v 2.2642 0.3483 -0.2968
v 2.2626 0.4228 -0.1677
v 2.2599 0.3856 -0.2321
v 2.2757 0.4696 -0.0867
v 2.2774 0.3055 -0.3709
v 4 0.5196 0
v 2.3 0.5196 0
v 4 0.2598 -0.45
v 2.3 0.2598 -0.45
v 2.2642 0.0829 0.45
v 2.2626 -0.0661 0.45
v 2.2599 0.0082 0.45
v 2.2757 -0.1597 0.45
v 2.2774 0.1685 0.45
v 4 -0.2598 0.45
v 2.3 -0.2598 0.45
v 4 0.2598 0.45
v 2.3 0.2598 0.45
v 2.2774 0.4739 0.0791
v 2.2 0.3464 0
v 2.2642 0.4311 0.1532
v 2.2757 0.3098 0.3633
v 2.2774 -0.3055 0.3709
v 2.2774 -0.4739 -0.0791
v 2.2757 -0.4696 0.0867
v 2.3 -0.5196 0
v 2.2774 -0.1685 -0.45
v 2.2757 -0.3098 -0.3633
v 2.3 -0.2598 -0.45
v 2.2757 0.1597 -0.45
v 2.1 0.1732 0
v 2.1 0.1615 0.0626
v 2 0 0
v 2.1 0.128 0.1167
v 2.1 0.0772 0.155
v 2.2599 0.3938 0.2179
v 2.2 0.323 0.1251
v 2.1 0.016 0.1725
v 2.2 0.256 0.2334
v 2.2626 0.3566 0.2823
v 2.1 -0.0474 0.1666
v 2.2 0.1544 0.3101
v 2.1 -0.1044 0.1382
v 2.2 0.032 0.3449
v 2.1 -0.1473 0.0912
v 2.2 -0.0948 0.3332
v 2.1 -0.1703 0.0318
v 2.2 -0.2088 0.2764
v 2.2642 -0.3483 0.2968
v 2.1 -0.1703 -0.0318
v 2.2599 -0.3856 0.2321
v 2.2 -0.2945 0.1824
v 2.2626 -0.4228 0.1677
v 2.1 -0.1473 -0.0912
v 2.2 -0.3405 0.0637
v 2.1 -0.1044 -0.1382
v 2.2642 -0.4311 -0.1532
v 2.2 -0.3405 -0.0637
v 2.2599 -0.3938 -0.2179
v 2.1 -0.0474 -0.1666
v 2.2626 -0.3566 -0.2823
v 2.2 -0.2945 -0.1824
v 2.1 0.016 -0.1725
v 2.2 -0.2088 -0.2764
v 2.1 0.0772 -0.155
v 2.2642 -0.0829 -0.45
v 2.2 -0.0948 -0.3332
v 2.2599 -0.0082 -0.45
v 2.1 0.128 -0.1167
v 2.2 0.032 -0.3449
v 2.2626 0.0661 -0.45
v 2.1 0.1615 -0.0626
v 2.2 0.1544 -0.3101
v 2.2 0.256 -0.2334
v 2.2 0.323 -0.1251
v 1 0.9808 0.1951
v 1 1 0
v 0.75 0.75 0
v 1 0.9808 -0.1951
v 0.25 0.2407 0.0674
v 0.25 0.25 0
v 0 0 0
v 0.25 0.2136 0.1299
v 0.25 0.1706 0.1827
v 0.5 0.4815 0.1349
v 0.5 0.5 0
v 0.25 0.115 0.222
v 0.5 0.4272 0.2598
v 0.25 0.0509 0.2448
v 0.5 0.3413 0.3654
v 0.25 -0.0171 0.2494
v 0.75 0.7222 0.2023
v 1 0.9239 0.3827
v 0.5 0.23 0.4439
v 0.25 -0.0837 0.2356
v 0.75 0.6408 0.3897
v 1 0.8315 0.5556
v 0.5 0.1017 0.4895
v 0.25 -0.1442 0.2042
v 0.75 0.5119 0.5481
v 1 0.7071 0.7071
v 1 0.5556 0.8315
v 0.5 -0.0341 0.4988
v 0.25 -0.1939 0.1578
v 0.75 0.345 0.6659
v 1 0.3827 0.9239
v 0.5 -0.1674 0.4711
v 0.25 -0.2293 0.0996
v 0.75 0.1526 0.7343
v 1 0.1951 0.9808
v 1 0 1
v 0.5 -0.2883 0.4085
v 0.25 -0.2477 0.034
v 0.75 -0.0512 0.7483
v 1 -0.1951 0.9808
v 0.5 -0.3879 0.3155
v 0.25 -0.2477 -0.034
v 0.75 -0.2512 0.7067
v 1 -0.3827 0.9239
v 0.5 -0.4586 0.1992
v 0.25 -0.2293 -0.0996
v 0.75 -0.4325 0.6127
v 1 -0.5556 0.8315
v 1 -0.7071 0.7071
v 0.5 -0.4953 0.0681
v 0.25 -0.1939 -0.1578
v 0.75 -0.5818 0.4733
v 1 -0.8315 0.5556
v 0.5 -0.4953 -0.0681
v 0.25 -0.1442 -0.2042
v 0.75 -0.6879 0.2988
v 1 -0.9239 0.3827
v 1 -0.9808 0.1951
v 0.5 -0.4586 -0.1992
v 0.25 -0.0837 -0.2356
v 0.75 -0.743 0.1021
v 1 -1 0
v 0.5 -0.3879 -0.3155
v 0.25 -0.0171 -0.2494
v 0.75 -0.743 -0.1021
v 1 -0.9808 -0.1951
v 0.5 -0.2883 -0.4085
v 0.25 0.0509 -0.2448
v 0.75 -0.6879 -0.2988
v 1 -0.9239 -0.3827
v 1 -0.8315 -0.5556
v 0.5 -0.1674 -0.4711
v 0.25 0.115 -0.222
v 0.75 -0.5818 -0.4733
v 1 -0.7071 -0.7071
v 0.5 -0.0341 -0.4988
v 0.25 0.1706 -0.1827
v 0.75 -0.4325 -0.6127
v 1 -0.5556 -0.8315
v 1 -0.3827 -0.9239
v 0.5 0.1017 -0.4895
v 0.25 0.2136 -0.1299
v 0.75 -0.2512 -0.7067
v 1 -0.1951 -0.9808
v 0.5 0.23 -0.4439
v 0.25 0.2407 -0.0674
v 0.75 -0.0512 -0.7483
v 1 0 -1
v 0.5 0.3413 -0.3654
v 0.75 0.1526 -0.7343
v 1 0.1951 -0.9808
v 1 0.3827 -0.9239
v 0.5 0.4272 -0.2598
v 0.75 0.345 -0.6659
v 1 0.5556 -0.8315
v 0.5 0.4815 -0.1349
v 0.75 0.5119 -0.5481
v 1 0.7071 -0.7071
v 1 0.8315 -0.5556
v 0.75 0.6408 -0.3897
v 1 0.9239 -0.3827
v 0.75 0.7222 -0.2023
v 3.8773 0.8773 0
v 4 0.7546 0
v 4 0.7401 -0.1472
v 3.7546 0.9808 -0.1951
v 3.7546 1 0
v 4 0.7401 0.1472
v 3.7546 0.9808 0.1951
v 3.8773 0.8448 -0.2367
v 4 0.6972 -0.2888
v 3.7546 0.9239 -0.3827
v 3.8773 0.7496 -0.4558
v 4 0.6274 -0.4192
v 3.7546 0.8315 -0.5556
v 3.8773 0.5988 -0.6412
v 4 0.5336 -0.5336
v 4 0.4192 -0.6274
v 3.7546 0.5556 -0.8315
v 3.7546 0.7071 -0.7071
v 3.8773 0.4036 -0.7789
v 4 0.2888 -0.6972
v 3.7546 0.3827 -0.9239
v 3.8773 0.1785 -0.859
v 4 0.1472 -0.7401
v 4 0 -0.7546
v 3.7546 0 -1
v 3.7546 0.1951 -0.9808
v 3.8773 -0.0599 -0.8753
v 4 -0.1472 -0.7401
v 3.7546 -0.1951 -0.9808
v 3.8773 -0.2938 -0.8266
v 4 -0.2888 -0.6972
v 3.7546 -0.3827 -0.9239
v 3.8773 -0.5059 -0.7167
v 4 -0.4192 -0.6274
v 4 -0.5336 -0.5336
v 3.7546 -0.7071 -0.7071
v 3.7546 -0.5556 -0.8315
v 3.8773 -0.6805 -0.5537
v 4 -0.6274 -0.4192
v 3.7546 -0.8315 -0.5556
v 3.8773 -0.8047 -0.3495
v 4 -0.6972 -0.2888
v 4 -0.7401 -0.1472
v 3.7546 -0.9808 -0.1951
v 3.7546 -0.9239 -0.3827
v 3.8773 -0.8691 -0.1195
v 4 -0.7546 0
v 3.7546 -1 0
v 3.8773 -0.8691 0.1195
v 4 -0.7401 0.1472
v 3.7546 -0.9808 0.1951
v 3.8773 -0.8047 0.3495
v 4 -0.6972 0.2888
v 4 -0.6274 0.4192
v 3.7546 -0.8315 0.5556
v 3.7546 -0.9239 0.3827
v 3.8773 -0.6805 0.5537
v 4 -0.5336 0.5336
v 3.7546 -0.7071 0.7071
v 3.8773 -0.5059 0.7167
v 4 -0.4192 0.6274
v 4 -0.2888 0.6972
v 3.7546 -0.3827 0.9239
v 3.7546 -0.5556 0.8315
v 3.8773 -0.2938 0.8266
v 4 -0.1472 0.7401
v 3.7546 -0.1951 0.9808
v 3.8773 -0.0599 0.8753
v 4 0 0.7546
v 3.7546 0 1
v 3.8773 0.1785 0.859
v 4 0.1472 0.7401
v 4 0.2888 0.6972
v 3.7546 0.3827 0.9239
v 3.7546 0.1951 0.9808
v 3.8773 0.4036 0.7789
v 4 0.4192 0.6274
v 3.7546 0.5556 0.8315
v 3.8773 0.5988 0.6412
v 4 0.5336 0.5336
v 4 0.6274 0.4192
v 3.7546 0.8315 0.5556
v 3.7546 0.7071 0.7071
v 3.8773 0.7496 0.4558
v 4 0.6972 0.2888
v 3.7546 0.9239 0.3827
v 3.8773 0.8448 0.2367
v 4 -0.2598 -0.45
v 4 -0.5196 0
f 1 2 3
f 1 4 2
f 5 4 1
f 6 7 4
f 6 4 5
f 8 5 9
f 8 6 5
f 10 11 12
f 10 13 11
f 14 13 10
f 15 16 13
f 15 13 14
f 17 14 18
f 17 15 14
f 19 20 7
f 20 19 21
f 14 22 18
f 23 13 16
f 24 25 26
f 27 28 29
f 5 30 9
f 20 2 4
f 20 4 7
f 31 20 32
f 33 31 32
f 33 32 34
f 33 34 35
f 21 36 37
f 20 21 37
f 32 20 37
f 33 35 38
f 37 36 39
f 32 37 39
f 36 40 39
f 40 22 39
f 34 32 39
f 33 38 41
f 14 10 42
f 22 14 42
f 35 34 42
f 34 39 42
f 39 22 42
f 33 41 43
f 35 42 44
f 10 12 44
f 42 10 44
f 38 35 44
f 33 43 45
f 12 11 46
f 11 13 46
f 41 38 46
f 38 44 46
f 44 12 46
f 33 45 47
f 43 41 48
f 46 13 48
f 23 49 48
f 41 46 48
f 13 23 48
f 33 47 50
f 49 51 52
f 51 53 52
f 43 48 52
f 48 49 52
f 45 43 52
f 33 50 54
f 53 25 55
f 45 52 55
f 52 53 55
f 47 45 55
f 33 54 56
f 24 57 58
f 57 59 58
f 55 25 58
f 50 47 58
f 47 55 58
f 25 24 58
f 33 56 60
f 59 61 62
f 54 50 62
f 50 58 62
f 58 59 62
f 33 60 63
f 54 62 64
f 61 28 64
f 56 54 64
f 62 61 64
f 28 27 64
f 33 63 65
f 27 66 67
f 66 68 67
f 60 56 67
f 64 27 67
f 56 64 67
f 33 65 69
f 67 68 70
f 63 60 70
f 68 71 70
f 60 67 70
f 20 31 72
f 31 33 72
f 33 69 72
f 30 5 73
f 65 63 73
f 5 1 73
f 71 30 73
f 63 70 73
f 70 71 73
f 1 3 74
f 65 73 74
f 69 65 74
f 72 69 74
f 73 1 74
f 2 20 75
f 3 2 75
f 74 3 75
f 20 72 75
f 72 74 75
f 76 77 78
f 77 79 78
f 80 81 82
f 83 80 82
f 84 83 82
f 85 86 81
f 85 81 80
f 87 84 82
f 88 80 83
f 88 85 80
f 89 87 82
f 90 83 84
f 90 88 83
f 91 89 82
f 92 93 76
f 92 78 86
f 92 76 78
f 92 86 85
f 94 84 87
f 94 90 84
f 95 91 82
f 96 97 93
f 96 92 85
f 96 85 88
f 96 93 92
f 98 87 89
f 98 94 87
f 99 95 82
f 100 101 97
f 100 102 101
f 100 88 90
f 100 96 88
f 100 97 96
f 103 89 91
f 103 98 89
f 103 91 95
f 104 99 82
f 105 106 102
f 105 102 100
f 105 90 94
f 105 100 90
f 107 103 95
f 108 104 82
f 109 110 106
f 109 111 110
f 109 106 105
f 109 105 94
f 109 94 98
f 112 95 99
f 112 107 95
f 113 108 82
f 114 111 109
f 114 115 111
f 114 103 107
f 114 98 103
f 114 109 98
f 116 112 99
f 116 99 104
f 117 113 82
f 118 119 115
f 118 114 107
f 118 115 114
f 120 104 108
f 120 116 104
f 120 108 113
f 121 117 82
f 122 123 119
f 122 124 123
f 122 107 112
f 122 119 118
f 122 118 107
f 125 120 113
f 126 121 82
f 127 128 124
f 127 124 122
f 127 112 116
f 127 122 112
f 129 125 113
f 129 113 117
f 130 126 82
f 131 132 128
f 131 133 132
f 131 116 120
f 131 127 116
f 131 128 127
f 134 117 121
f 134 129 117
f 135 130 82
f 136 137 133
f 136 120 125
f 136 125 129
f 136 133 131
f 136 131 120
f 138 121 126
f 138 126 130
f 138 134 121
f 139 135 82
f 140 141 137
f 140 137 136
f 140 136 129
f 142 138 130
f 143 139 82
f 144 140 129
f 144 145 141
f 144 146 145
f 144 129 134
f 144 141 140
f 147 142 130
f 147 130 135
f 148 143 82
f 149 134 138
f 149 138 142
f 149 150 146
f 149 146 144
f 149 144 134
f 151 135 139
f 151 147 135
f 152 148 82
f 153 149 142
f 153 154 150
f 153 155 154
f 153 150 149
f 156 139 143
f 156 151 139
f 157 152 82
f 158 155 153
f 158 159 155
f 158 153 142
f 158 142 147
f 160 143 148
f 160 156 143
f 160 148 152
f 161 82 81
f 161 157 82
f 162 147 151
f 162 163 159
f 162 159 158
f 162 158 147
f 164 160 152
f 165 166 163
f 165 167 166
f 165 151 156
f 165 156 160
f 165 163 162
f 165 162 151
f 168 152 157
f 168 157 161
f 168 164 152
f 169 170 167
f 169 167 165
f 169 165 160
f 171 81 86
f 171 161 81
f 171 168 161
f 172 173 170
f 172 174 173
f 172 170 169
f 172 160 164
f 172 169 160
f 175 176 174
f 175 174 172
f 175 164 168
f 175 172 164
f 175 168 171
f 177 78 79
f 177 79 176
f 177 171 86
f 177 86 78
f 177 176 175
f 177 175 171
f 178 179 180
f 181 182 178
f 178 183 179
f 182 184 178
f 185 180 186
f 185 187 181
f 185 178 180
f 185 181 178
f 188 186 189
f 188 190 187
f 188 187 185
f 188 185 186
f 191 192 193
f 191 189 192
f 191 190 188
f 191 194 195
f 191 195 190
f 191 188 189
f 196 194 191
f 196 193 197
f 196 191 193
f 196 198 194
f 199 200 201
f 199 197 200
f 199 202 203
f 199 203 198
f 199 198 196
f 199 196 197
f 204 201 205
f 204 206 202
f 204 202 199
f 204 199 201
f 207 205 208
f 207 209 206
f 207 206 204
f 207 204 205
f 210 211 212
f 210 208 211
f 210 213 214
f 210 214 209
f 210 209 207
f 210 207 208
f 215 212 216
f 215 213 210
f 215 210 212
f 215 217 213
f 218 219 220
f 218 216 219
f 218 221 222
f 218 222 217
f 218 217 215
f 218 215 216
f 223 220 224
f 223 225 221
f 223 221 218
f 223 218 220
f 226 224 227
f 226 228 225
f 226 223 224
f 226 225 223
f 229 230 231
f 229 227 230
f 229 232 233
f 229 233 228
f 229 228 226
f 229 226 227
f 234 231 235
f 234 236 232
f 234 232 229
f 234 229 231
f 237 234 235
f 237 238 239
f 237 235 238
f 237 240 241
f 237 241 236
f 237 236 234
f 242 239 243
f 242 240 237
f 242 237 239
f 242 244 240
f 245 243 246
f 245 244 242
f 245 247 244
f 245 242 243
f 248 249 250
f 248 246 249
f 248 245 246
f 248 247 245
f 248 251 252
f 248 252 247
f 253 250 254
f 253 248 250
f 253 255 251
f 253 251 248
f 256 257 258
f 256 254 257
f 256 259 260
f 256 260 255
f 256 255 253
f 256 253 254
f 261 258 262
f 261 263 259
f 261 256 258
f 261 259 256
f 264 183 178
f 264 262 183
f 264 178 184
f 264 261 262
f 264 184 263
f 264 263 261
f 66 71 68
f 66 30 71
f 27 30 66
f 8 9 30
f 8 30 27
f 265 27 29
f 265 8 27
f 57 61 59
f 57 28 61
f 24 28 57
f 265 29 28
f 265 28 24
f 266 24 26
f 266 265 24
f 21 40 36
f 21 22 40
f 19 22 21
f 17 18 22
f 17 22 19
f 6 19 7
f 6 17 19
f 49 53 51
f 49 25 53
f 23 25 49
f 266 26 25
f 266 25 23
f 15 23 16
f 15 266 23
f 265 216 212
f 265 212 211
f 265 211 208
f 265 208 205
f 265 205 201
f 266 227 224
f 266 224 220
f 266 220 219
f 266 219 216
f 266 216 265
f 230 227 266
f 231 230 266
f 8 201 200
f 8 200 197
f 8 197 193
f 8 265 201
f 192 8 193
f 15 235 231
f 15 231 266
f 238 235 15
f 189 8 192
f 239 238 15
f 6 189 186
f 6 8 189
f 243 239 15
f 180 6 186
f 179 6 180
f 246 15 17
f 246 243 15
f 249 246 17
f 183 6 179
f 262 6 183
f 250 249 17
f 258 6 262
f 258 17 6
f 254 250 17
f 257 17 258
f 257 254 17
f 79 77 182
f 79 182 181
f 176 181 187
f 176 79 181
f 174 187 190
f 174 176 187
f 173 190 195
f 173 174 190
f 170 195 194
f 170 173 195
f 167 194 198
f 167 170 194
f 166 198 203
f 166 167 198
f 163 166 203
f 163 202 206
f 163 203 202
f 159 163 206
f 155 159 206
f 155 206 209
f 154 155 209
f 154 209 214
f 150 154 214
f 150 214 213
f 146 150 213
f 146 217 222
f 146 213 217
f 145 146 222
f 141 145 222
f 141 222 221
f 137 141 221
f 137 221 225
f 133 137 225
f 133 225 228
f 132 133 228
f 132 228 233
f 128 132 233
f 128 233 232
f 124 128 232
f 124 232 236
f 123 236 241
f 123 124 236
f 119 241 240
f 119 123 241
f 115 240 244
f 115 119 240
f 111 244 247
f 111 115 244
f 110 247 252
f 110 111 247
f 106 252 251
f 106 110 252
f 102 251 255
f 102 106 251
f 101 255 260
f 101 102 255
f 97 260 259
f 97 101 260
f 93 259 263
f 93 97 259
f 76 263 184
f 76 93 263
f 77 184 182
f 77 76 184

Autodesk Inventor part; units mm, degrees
ref_plane "YZ Plane" through (0, 0, 0) normal (1, 0, 0) x (0, 1, 0)
ref_plane "XZ Plane" through (0, 0, 0) normal (0, 1, 0) x (-1, 0, 0)
sketch "Esquisse1" plane through (0, 0, 0) normal (0, 0, 1) x (1, 0, 0)
  line L0 (0, 0) -> (2, 0)
  line L1 (4, 0.5196) -> (4, 1)
  line L2 (4, 1) -> (0, 1)
  line L3 (4, 0.5196) -> (2.3, 0.5196)
  line L4 (2.3, 0.5196) -> (2, 0)
  line L5 (0, -0.2) -> (0, 1.2) projected
  line L6 (0, 1) -> (0, 0)
  dimension "d0" = 1.7
  dimension "d1" = 60
  dimension "d2" = 2
  dimension "d3" = 1.0392
  dimension "d5" = 4
revolve "Corps" add sketch "Esquisse1" angle 360 about axis through (0, 0, 0) along (1, 0, 0)
sketch "Esquisse2" plane through (4, 0, 0) normal (1, 0, 0) x (0, 1, 0)
  circle A0 centre (0, 0) radius 0.5196 projected
  line L0 (-0.2598, 0.45) -> (0.2598, 0.45)
  line L1 (0.2598, 0.45) -> (0.5196, 0)
  line L2 (0.5196, 0) -> (0.2598, -0.45)
  line L3 (0.2598, -0.45) -> (-0.2598, -0.45)
  line L4 (-0.2598, -0.45) -> (-0.5196, 0)
  line L5 (-0.5196, 0) -> (-0.2598, 0.45)
  point P0 (0, 0)
  point P1 (0, 0)
extrude "Rainure" add sketch "Esquisse2" against normal up to next contours L1 A0 | A0 L2 | L0 A0 | A0 L3 | L5 A0 | A0 L4
thread "Filetage" size "M2x0.4" class "6g" standard "ISO Metric profile" length 4
chamfer "Chanfrein1" distance 1 angle 45 1 edges at (0, -1, 0) measured on face at (2.6667, 0.9871, -0.1604)
chamfer "Chanfrein2" distance 0.2454 angle 45 1 edges at (4, -1, 0) measured on face at (2.9998, 0.9871, -0.1604)
ref_plane "Work Plane1" through (2, 0, 0) normal (0, 0, 1) x (1, 0, 0)
equation "\"d0\" = INTI"
equation "\"d2\" = NND"
equation "\"d3\" = 1.1547 * SW"
equation "\"d5\" = NLG"
equation "\"d12\" = NLG"
equation "\"d9\" = FAWI"
equation "\"d10\" = -0.5 * GD1 + 0.5 * NND"
equation "\"d11\" = FAWI"
equation "\"d35\" = -0.5 * GD1 + 0.5 * NND"
equation "\"NND\" = 2"
equation "\"NLG\" = 4"
equation "\"INTI\" = 1.7"
equation "\"FAWI\" = 45deg"
equation "\"SW\" = 0.9"
equation "\"GD1\" = THREADDIA - 1.2269 * PTC"
equation "\"FAWI1\" = 45deg"
equation "\"SPD\" = 0.00001"
equation "\"GUL\" = 0.61345 * PTC"
equation "\"TOA\" = 30deg"
equation "\"THREADDIA\" = 2"
equation "\"PTC\" = 0.4"
equation "\"GAL\" = 0.61345 * PTC"
equation "\"E0\" = 1.155 * SW"
properties part number "F000" material "Acier / Stahl"
